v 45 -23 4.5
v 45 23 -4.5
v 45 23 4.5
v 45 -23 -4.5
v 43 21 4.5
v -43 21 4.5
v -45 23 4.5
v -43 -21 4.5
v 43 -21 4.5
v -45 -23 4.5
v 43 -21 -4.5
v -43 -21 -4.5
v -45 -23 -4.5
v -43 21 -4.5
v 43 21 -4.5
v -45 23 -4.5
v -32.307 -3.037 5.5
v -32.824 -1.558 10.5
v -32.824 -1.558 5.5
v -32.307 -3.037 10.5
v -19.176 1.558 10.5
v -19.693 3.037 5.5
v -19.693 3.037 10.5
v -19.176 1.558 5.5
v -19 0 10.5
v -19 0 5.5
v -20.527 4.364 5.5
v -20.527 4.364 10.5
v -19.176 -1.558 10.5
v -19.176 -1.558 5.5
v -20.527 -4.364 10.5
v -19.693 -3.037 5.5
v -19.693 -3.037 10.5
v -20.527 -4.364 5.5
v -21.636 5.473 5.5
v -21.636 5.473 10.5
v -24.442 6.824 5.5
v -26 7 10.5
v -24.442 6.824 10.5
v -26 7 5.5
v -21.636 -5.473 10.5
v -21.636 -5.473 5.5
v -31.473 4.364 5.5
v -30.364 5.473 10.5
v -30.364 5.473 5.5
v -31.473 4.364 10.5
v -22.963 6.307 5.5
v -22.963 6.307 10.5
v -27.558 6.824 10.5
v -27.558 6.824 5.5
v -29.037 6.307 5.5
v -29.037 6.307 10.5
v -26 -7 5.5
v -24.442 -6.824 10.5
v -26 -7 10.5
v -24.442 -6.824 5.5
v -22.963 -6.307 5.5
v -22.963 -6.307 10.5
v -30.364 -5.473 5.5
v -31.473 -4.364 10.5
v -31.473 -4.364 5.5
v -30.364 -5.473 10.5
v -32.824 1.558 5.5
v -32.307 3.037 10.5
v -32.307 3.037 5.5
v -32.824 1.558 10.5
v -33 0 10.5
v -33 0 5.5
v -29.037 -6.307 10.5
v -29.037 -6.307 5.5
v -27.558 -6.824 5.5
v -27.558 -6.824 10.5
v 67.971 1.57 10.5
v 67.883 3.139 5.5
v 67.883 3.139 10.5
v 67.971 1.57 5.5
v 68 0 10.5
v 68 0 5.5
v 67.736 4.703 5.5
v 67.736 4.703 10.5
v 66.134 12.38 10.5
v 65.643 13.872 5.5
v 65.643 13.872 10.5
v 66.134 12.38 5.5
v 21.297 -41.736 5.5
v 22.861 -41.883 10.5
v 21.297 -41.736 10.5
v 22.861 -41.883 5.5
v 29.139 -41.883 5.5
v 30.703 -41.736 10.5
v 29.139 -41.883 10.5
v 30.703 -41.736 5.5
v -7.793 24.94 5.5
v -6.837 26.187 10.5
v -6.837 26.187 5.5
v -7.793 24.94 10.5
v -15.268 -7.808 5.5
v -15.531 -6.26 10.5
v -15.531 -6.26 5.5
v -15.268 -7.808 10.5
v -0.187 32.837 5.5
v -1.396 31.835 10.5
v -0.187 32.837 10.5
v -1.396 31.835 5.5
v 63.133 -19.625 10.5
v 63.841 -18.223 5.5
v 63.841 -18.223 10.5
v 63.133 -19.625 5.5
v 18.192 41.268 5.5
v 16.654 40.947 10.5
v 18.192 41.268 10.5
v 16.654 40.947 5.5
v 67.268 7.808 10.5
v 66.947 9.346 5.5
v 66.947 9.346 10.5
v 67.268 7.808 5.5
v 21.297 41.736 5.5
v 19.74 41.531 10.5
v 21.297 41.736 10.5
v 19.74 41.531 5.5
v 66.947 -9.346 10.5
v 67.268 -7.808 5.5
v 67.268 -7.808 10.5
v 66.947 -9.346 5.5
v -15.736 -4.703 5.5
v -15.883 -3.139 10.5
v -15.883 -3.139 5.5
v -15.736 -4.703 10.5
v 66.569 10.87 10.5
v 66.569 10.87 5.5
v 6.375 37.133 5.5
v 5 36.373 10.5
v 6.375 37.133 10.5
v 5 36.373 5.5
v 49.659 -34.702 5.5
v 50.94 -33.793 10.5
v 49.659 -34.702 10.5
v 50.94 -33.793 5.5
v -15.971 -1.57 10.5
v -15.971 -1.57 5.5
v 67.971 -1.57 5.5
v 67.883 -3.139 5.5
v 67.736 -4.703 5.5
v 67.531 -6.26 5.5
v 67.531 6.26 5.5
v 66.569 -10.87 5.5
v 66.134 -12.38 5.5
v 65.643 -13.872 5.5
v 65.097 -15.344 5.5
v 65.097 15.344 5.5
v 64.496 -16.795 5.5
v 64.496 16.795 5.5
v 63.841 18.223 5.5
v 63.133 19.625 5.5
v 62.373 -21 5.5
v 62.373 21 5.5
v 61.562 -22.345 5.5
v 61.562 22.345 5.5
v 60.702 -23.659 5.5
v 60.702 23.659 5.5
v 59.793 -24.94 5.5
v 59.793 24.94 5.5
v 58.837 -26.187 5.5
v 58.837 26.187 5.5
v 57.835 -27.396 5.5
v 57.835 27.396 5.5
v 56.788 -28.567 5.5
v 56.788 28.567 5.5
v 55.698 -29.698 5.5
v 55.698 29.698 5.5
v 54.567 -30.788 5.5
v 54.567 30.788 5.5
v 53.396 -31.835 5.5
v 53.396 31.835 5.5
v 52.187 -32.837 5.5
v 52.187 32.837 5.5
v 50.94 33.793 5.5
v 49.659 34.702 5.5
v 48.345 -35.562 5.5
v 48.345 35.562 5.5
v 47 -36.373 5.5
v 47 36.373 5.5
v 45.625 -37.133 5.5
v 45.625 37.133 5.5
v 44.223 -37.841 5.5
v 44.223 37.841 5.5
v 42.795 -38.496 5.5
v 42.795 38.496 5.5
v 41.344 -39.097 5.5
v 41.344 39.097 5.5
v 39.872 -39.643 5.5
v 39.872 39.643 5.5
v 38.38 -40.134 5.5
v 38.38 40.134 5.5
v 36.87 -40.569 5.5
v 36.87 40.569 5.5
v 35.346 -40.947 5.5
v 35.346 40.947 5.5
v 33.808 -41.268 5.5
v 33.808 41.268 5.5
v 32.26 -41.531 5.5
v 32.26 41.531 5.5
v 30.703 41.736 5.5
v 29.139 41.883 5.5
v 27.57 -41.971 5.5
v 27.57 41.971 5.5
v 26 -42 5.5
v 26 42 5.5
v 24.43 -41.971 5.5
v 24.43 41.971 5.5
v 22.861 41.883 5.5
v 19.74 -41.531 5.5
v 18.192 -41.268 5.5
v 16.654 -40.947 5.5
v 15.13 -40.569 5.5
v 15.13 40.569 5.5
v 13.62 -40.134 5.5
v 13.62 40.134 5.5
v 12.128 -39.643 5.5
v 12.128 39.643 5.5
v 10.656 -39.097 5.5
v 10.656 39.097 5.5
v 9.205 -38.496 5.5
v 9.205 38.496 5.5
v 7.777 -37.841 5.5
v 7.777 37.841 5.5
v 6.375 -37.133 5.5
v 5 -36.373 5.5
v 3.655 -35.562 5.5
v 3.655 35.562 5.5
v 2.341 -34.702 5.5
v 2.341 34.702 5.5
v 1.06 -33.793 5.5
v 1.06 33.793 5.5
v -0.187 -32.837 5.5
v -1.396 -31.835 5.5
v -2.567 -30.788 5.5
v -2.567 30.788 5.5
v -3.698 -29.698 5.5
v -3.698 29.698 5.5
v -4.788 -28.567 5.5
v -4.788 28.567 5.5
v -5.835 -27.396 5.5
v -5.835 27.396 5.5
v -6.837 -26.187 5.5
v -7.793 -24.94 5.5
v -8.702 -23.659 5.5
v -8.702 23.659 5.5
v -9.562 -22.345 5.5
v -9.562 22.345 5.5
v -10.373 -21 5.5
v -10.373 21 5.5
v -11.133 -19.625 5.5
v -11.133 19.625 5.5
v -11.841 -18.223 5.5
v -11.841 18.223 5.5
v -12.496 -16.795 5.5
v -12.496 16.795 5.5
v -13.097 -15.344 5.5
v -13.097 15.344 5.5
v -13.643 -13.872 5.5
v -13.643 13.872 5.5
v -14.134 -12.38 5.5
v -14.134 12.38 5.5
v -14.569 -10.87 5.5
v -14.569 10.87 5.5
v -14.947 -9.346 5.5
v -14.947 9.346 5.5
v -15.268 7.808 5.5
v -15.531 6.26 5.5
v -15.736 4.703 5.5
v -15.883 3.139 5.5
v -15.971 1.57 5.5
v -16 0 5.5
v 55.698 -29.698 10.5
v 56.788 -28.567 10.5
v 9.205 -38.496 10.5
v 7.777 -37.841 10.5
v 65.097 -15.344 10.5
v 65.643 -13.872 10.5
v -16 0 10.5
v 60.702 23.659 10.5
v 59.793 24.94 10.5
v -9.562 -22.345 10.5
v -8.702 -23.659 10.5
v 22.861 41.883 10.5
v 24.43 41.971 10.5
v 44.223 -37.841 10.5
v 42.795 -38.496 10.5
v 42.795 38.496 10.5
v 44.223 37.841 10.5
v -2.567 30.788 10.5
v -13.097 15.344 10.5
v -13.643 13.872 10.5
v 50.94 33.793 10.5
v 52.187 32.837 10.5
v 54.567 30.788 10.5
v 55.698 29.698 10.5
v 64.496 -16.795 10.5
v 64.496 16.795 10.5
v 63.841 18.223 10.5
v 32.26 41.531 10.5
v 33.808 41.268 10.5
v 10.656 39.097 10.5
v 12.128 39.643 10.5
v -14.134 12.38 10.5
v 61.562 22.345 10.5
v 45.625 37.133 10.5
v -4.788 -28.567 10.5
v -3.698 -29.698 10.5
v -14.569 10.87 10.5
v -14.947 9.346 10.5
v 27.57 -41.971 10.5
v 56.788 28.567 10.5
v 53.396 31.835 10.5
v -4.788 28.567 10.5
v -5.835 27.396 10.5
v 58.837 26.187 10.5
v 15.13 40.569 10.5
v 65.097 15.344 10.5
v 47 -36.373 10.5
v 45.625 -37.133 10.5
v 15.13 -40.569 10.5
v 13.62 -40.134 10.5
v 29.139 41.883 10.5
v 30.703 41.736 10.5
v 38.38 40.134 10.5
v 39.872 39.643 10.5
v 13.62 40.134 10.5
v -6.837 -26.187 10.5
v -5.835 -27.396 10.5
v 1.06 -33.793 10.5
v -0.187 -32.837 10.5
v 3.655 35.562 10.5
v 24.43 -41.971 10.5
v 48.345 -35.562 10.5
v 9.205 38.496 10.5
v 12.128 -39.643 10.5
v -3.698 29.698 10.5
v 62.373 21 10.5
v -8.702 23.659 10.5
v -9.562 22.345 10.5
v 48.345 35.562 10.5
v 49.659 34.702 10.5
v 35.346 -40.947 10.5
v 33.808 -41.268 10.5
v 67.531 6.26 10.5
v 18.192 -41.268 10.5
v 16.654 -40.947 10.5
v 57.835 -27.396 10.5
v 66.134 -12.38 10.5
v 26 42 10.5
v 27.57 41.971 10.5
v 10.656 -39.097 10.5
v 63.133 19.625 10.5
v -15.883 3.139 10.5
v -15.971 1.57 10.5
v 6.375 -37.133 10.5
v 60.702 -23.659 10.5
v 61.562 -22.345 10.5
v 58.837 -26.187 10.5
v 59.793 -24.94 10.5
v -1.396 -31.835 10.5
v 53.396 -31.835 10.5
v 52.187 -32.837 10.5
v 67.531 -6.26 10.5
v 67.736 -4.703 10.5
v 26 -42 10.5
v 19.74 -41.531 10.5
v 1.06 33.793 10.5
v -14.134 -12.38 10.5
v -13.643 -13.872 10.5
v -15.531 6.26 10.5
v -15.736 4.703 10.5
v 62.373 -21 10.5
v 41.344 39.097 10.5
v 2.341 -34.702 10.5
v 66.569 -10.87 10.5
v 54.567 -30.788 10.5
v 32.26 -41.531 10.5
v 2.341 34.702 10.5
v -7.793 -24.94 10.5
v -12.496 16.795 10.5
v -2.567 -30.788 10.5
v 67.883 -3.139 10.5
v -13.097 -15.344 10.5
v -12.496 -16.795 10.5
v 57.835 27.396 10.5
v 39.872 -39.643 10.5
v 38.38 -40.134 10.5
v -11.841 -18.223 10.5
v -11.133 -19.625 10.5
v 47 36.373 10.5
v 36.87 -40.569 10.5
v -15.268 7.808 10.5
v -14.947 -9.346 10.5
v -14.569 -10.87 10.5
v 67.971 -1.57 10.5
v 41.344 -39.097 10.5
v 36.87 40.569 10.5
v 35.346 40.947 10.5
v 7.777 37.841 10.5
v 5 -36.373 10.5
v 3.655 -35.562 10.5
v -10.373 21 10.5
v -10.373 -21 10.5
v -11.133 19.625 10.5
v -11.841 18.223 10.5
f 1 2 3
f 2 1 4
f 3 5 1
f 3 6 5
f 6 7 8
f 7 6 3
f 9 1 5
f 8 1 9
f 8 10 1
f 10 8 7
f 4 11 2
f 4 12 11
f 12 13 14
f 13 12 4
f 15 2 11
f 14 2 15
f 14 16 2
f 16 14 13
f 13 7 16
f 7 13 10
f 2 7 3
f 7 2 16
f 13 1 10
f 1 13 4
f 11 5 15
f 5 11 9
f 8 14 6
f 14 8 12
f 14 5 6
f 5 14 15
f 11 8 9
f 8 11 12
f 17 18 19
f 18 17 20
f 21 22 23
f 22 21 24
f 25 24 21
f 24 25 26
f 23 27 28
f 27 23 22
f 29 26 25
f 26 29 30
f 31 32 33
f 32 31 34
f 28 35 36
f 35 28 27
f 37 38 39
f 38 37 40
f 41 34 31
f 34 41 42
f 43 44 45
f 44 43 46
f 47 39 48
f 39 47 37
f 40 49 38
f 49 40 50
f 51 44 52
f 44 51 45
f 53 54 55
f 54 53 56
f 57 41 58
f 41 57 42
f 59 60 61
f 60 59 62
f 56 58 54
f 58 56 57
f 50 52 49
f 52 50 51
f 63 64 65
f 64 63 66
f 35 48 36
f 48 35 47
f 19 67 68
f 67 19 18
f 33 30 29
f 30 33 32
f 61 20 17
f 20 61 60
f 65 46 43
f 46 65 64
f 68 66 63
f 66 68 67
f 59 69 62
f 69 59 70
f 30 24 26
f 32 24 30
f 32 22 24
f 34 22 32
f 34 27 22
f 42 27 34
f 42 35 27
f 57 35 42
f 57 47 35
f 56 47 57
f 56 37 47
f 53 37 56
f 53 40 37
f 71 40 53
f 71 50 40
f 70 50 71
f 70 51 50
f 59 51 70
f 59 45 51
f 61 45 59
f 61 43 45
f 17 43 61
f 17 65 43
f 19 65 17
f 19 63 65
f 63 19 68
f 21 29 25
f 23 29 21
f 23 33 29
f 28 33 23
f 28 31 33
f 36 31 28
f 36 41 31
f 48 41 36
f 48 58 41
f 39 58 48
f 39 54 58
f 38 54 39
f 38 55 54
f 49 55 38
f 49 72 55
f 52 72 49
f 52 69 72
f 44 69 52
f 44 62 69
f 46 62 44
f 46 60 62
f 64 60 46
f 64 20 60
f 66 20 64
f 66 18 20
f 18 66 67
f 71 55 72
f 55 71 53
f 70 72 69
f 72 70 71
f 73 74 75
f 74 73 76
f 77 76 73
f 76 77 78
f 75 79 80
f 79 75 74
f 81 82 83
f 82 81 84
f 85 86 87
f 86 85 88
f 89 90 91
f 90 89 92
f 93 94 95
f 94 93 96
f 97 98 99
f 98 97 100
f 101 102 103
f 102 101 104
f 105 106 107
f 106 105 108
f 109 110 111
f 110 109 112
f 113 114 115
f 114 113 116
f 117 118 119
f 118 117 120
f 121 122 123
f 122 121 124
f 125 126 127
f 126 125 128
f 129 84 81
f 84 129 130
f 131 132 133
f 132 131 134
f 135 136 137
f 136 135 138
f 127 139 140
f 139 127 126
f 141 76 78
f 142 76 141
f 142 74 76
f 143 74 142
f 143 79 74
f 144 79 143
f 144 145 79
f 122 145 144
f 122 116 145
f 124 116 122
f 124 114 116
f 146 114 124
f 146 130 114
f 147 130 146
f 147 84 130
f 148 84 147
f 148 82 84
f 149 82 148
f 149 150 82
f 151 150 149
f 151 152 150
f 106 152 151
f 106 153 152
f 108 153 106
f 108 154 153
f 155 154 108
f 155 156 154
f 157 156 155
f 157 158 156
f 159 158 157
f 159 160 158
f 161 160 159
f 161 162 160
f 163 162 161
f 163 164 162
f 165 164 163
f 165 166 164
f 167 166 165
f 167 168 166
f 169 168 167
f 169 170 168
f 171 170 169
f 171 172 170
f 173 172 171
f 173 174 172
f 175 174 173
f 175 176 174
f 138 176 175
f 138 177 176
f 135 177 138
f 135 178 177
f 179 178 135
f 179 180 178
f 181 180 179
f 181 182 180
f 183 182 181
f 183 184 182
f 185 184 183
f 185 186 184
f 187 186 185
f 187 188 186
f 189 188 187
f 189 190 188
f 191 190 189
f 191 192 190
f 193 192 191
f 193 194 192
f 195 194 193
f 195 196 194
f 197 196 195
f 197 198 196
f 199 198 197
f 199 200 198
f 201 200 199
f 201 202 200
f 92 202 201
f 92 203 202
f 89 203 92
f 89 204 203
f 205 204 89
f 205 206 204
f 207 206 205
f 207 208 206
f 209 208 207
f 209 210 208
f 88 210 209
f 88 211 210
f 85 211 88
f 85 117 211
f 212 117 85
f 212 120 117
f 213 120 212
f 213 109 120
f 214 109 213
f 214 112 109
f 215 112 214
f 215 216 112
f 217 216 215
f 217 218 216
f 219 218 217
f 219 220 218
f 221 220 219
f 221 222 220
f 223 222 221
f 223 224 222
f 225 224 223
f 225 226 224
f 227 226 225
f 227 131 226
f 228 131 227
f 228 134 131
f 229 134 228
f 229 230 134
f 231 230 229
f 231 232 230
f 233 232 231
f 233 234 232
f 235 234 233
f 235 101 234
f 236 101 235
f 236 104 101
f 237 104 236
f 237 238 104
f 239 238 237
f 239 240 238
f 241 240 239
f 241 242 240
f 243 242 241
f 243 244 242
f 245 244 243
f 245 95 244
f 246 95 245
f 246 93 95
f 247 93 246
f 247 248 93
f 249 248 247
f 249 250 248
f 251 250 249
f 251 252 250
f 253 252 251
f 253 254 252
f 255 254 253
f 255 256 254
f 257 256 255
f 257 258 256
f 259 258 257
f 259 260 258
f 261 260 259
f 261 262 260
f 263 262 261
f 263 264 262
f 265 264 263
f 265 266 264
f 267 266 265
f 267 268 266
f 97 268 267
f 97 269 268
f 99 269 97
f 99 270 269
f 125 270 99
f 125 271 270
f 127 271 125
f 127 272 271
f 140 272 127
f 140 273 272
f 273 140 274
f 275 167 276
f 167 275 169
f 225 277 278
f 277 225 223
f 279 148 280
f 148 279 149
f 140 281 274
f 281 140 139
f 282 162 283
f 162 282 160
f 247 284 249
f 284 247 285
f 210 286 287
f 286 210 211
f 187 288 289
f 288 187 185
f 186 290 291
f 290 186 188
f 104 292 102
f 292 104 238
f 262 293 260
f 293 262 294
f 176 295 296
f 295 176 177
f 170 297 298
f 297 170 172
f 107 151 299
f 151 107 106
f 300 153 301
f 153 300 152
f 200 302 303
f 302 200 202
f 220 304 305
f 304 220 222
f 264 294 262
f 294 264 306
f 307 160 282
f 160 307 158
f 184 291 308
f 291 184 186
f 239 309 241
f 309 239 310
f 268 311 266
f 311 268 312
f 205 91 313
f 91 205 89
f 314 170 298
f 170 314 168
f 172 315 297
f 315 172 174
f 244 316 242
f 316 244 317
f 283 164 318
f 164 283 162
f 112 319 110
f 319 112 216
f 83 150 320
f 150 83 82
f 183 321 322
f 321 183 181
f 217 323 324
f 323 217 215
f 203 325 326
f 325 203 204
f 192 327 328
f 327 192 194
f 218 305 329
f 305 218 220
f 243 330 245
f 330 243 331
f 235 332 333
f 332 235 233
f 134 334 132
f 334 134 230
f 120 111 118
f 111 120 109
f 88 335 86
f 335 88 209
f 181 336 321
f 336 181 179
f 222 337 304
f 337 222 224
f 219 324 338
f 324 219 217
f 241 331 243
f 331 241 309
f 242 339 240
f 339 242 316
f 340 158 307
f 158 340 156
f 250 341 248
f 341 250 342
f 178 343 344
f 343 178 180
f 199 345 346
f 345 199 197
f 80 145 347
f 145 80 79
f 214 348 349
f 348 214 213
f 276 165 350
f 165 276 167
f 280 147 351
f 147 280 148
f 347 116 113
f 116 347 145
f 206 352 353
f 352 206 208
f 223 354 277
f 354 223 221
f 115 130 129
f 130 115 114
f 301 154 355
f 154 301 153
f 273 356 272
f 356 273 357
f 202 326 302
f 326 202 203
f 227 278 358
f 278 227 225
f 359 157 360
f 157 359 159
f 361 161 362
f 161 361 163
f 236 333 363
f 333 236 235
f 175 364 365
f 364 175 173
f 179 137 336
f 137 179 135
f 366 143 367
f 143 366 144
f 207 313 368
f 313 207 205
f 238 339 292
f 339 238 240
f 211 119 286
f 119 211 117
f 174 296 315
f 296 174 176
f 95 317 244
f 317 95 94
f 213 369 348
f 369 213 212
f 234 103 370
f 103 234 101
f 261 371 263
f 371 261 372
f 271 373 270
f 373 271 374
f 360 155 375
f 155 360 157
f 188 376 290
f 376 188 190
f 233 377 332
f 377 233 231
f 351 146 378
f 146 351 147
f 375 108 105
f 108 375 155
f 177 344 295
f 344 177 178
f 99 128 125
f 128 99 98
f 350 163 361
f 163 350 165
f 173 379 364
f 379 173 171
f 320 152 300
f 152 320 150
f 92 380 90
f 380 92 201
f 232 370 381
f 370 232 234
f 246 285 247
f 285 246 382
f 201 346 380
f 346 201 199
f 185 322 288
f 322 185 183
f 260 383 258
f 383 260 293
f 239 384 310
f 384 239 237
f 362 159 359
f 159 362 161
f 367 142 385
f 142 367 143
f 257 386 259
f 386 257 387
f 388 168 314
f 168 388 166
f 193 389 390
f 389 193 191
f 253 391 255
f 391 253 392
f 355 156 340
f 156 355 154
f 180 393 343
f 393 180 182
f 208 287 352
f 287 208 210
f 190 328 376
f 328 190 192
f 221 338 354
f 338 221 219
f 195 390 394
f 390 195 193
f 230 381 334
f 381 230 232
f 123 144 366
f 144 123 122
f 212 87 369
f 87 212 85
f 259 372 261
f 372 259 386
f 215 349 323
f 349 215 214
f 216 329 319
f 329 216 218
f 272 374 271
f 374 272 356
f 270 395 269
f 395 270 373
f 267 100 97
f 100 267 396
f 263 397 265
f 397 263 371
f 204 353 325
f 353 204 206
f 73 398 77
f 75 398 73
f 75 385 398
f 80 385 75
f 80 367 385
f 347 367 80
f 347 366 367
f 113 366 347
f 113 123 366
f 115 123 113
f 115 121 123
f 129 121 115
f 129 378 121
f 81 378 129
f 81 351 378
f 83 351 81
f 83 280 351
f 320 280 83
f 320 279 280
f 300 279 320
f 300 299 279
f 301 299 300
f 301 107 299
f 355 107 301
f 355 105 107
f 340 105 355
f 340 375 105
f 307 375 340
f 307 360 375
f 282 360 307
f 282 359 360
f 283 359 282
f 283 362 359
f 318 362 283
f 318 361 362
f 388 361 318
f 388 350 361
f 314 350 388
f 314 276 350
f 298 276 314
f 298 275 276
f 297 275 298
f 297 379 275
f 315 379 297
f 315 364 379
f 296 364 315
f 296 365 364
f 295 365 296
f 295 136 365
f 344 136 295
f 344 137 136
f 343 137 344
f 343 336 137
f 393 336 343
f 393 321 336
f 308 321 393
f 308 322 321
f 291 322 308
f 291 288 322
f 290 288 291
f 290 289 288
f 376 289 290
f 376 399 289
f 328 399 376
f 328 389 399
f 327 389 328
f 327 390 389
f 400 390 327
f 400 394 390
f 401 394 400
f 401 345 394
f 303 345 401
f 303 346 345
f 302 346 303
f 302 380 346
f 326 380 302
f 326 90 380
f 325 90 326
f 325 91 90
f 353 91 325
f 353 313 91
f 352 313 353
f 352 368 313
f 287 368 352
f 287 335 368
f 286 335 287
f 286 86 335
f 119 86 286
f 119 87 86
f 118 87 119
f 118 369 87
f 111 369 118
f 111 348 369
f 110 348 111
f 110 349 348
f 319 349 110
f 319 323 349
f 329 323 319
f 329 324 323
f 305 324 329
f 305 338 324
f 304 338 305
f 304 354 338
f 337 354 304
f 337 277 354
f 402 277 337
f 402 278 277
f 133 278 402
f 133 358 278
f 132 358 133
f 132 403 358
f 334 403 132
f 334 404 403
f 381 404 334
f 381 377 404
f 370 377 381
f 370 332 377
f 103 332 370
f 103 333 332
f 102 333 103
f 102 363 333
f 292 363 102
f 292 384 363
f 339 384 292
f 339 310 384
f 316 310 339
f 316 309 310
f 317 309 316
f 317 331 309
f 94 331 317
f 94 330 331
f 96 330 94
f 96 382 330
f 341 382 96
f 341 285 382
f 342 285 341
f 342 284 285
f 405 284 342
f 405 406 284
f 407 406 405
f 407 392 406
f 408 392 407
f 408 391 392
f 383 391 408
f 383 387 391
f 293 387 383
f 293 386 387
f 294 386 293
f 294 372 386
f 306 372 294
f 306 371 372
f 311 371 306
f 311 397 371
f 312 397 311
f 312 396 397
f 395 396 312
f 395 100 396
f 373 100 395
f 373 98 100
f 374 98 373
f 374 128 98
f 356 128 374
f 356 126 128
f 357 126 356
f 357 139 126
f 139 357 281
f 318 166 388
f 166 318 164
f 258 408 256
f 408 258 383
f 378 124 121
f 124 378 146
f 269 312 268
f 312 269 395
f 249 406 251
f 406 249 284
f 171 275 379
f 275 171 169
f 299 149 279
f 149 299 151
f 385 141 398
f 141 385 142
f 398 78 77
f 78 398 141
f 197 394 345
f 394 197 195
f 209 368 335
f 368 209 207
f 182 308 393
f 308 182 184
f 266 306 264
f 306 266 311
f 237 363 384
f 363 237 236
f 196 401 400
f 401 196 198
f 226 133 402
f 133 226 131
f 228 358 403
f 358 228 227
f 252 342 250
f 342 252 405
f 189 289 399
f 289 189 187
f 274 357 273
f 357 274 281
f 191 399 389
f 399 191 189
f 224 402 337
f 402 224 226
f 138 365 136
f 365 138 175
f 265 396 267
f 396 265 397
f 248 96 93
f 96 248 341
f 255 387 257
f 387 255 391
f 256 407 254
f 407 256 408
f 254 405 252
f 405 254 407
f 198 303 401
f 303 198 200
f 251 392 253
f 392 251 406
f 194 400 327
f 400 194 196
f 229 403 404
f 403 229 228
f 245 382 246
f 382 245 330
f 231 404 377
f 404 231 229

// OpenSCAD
// MiniClaw drive housing checkpoint 2
// Revised after skill-guided review with MiniClaw MCP context.

module_name = "MiniClaw drive housing v2";
housing_wall = 2.0;       // mm, ACME-VND-002 PLA recommendation
pinion_teeth = 14;        // module 1.0 minimum per ACME-ENG-001
output_teeth = 84;        // keeps 6:1 reduction after pinion change
gear_module = 1.0;
face_width = 5.0;         // mm, inside 4-6x module production range
nominal_backlash = 0.12;  // mm, ACME-ENG-001 PLA range
pivot_bore = 3.20;        // clearance fit; retained pin instead of press fit
root_fillet = 0.6;        // mm, reduces tooth-root stress concentration

module gear_disc(teeth, radius, width) {
  cylinder(h = width, r = radius, $fn = teeth * 2);
}

difference() {
  cube([90, 46, 9], center = true);
  translate([0, 0, -1]) cube([90 - 2 * housing_wall, 46 - 2 * housing_wall, 11], center = true);
  translate([-26, 0, -5]) cylinder(h = 14, d = pivot_bore, $fn = 48);
  translate([26, 0, -5]) cylinder(h = 14, d = pivot_bore, $fn = 48);
}

translate([-26, 0, 5.5]) gear_disc(pinion_teeth, pinion_teeth * gear_module / 2, face_width);
translate([26, 0, 5.5]) gear_disc(output_teeth, output_teeth * gear_module / 2, face_width);
